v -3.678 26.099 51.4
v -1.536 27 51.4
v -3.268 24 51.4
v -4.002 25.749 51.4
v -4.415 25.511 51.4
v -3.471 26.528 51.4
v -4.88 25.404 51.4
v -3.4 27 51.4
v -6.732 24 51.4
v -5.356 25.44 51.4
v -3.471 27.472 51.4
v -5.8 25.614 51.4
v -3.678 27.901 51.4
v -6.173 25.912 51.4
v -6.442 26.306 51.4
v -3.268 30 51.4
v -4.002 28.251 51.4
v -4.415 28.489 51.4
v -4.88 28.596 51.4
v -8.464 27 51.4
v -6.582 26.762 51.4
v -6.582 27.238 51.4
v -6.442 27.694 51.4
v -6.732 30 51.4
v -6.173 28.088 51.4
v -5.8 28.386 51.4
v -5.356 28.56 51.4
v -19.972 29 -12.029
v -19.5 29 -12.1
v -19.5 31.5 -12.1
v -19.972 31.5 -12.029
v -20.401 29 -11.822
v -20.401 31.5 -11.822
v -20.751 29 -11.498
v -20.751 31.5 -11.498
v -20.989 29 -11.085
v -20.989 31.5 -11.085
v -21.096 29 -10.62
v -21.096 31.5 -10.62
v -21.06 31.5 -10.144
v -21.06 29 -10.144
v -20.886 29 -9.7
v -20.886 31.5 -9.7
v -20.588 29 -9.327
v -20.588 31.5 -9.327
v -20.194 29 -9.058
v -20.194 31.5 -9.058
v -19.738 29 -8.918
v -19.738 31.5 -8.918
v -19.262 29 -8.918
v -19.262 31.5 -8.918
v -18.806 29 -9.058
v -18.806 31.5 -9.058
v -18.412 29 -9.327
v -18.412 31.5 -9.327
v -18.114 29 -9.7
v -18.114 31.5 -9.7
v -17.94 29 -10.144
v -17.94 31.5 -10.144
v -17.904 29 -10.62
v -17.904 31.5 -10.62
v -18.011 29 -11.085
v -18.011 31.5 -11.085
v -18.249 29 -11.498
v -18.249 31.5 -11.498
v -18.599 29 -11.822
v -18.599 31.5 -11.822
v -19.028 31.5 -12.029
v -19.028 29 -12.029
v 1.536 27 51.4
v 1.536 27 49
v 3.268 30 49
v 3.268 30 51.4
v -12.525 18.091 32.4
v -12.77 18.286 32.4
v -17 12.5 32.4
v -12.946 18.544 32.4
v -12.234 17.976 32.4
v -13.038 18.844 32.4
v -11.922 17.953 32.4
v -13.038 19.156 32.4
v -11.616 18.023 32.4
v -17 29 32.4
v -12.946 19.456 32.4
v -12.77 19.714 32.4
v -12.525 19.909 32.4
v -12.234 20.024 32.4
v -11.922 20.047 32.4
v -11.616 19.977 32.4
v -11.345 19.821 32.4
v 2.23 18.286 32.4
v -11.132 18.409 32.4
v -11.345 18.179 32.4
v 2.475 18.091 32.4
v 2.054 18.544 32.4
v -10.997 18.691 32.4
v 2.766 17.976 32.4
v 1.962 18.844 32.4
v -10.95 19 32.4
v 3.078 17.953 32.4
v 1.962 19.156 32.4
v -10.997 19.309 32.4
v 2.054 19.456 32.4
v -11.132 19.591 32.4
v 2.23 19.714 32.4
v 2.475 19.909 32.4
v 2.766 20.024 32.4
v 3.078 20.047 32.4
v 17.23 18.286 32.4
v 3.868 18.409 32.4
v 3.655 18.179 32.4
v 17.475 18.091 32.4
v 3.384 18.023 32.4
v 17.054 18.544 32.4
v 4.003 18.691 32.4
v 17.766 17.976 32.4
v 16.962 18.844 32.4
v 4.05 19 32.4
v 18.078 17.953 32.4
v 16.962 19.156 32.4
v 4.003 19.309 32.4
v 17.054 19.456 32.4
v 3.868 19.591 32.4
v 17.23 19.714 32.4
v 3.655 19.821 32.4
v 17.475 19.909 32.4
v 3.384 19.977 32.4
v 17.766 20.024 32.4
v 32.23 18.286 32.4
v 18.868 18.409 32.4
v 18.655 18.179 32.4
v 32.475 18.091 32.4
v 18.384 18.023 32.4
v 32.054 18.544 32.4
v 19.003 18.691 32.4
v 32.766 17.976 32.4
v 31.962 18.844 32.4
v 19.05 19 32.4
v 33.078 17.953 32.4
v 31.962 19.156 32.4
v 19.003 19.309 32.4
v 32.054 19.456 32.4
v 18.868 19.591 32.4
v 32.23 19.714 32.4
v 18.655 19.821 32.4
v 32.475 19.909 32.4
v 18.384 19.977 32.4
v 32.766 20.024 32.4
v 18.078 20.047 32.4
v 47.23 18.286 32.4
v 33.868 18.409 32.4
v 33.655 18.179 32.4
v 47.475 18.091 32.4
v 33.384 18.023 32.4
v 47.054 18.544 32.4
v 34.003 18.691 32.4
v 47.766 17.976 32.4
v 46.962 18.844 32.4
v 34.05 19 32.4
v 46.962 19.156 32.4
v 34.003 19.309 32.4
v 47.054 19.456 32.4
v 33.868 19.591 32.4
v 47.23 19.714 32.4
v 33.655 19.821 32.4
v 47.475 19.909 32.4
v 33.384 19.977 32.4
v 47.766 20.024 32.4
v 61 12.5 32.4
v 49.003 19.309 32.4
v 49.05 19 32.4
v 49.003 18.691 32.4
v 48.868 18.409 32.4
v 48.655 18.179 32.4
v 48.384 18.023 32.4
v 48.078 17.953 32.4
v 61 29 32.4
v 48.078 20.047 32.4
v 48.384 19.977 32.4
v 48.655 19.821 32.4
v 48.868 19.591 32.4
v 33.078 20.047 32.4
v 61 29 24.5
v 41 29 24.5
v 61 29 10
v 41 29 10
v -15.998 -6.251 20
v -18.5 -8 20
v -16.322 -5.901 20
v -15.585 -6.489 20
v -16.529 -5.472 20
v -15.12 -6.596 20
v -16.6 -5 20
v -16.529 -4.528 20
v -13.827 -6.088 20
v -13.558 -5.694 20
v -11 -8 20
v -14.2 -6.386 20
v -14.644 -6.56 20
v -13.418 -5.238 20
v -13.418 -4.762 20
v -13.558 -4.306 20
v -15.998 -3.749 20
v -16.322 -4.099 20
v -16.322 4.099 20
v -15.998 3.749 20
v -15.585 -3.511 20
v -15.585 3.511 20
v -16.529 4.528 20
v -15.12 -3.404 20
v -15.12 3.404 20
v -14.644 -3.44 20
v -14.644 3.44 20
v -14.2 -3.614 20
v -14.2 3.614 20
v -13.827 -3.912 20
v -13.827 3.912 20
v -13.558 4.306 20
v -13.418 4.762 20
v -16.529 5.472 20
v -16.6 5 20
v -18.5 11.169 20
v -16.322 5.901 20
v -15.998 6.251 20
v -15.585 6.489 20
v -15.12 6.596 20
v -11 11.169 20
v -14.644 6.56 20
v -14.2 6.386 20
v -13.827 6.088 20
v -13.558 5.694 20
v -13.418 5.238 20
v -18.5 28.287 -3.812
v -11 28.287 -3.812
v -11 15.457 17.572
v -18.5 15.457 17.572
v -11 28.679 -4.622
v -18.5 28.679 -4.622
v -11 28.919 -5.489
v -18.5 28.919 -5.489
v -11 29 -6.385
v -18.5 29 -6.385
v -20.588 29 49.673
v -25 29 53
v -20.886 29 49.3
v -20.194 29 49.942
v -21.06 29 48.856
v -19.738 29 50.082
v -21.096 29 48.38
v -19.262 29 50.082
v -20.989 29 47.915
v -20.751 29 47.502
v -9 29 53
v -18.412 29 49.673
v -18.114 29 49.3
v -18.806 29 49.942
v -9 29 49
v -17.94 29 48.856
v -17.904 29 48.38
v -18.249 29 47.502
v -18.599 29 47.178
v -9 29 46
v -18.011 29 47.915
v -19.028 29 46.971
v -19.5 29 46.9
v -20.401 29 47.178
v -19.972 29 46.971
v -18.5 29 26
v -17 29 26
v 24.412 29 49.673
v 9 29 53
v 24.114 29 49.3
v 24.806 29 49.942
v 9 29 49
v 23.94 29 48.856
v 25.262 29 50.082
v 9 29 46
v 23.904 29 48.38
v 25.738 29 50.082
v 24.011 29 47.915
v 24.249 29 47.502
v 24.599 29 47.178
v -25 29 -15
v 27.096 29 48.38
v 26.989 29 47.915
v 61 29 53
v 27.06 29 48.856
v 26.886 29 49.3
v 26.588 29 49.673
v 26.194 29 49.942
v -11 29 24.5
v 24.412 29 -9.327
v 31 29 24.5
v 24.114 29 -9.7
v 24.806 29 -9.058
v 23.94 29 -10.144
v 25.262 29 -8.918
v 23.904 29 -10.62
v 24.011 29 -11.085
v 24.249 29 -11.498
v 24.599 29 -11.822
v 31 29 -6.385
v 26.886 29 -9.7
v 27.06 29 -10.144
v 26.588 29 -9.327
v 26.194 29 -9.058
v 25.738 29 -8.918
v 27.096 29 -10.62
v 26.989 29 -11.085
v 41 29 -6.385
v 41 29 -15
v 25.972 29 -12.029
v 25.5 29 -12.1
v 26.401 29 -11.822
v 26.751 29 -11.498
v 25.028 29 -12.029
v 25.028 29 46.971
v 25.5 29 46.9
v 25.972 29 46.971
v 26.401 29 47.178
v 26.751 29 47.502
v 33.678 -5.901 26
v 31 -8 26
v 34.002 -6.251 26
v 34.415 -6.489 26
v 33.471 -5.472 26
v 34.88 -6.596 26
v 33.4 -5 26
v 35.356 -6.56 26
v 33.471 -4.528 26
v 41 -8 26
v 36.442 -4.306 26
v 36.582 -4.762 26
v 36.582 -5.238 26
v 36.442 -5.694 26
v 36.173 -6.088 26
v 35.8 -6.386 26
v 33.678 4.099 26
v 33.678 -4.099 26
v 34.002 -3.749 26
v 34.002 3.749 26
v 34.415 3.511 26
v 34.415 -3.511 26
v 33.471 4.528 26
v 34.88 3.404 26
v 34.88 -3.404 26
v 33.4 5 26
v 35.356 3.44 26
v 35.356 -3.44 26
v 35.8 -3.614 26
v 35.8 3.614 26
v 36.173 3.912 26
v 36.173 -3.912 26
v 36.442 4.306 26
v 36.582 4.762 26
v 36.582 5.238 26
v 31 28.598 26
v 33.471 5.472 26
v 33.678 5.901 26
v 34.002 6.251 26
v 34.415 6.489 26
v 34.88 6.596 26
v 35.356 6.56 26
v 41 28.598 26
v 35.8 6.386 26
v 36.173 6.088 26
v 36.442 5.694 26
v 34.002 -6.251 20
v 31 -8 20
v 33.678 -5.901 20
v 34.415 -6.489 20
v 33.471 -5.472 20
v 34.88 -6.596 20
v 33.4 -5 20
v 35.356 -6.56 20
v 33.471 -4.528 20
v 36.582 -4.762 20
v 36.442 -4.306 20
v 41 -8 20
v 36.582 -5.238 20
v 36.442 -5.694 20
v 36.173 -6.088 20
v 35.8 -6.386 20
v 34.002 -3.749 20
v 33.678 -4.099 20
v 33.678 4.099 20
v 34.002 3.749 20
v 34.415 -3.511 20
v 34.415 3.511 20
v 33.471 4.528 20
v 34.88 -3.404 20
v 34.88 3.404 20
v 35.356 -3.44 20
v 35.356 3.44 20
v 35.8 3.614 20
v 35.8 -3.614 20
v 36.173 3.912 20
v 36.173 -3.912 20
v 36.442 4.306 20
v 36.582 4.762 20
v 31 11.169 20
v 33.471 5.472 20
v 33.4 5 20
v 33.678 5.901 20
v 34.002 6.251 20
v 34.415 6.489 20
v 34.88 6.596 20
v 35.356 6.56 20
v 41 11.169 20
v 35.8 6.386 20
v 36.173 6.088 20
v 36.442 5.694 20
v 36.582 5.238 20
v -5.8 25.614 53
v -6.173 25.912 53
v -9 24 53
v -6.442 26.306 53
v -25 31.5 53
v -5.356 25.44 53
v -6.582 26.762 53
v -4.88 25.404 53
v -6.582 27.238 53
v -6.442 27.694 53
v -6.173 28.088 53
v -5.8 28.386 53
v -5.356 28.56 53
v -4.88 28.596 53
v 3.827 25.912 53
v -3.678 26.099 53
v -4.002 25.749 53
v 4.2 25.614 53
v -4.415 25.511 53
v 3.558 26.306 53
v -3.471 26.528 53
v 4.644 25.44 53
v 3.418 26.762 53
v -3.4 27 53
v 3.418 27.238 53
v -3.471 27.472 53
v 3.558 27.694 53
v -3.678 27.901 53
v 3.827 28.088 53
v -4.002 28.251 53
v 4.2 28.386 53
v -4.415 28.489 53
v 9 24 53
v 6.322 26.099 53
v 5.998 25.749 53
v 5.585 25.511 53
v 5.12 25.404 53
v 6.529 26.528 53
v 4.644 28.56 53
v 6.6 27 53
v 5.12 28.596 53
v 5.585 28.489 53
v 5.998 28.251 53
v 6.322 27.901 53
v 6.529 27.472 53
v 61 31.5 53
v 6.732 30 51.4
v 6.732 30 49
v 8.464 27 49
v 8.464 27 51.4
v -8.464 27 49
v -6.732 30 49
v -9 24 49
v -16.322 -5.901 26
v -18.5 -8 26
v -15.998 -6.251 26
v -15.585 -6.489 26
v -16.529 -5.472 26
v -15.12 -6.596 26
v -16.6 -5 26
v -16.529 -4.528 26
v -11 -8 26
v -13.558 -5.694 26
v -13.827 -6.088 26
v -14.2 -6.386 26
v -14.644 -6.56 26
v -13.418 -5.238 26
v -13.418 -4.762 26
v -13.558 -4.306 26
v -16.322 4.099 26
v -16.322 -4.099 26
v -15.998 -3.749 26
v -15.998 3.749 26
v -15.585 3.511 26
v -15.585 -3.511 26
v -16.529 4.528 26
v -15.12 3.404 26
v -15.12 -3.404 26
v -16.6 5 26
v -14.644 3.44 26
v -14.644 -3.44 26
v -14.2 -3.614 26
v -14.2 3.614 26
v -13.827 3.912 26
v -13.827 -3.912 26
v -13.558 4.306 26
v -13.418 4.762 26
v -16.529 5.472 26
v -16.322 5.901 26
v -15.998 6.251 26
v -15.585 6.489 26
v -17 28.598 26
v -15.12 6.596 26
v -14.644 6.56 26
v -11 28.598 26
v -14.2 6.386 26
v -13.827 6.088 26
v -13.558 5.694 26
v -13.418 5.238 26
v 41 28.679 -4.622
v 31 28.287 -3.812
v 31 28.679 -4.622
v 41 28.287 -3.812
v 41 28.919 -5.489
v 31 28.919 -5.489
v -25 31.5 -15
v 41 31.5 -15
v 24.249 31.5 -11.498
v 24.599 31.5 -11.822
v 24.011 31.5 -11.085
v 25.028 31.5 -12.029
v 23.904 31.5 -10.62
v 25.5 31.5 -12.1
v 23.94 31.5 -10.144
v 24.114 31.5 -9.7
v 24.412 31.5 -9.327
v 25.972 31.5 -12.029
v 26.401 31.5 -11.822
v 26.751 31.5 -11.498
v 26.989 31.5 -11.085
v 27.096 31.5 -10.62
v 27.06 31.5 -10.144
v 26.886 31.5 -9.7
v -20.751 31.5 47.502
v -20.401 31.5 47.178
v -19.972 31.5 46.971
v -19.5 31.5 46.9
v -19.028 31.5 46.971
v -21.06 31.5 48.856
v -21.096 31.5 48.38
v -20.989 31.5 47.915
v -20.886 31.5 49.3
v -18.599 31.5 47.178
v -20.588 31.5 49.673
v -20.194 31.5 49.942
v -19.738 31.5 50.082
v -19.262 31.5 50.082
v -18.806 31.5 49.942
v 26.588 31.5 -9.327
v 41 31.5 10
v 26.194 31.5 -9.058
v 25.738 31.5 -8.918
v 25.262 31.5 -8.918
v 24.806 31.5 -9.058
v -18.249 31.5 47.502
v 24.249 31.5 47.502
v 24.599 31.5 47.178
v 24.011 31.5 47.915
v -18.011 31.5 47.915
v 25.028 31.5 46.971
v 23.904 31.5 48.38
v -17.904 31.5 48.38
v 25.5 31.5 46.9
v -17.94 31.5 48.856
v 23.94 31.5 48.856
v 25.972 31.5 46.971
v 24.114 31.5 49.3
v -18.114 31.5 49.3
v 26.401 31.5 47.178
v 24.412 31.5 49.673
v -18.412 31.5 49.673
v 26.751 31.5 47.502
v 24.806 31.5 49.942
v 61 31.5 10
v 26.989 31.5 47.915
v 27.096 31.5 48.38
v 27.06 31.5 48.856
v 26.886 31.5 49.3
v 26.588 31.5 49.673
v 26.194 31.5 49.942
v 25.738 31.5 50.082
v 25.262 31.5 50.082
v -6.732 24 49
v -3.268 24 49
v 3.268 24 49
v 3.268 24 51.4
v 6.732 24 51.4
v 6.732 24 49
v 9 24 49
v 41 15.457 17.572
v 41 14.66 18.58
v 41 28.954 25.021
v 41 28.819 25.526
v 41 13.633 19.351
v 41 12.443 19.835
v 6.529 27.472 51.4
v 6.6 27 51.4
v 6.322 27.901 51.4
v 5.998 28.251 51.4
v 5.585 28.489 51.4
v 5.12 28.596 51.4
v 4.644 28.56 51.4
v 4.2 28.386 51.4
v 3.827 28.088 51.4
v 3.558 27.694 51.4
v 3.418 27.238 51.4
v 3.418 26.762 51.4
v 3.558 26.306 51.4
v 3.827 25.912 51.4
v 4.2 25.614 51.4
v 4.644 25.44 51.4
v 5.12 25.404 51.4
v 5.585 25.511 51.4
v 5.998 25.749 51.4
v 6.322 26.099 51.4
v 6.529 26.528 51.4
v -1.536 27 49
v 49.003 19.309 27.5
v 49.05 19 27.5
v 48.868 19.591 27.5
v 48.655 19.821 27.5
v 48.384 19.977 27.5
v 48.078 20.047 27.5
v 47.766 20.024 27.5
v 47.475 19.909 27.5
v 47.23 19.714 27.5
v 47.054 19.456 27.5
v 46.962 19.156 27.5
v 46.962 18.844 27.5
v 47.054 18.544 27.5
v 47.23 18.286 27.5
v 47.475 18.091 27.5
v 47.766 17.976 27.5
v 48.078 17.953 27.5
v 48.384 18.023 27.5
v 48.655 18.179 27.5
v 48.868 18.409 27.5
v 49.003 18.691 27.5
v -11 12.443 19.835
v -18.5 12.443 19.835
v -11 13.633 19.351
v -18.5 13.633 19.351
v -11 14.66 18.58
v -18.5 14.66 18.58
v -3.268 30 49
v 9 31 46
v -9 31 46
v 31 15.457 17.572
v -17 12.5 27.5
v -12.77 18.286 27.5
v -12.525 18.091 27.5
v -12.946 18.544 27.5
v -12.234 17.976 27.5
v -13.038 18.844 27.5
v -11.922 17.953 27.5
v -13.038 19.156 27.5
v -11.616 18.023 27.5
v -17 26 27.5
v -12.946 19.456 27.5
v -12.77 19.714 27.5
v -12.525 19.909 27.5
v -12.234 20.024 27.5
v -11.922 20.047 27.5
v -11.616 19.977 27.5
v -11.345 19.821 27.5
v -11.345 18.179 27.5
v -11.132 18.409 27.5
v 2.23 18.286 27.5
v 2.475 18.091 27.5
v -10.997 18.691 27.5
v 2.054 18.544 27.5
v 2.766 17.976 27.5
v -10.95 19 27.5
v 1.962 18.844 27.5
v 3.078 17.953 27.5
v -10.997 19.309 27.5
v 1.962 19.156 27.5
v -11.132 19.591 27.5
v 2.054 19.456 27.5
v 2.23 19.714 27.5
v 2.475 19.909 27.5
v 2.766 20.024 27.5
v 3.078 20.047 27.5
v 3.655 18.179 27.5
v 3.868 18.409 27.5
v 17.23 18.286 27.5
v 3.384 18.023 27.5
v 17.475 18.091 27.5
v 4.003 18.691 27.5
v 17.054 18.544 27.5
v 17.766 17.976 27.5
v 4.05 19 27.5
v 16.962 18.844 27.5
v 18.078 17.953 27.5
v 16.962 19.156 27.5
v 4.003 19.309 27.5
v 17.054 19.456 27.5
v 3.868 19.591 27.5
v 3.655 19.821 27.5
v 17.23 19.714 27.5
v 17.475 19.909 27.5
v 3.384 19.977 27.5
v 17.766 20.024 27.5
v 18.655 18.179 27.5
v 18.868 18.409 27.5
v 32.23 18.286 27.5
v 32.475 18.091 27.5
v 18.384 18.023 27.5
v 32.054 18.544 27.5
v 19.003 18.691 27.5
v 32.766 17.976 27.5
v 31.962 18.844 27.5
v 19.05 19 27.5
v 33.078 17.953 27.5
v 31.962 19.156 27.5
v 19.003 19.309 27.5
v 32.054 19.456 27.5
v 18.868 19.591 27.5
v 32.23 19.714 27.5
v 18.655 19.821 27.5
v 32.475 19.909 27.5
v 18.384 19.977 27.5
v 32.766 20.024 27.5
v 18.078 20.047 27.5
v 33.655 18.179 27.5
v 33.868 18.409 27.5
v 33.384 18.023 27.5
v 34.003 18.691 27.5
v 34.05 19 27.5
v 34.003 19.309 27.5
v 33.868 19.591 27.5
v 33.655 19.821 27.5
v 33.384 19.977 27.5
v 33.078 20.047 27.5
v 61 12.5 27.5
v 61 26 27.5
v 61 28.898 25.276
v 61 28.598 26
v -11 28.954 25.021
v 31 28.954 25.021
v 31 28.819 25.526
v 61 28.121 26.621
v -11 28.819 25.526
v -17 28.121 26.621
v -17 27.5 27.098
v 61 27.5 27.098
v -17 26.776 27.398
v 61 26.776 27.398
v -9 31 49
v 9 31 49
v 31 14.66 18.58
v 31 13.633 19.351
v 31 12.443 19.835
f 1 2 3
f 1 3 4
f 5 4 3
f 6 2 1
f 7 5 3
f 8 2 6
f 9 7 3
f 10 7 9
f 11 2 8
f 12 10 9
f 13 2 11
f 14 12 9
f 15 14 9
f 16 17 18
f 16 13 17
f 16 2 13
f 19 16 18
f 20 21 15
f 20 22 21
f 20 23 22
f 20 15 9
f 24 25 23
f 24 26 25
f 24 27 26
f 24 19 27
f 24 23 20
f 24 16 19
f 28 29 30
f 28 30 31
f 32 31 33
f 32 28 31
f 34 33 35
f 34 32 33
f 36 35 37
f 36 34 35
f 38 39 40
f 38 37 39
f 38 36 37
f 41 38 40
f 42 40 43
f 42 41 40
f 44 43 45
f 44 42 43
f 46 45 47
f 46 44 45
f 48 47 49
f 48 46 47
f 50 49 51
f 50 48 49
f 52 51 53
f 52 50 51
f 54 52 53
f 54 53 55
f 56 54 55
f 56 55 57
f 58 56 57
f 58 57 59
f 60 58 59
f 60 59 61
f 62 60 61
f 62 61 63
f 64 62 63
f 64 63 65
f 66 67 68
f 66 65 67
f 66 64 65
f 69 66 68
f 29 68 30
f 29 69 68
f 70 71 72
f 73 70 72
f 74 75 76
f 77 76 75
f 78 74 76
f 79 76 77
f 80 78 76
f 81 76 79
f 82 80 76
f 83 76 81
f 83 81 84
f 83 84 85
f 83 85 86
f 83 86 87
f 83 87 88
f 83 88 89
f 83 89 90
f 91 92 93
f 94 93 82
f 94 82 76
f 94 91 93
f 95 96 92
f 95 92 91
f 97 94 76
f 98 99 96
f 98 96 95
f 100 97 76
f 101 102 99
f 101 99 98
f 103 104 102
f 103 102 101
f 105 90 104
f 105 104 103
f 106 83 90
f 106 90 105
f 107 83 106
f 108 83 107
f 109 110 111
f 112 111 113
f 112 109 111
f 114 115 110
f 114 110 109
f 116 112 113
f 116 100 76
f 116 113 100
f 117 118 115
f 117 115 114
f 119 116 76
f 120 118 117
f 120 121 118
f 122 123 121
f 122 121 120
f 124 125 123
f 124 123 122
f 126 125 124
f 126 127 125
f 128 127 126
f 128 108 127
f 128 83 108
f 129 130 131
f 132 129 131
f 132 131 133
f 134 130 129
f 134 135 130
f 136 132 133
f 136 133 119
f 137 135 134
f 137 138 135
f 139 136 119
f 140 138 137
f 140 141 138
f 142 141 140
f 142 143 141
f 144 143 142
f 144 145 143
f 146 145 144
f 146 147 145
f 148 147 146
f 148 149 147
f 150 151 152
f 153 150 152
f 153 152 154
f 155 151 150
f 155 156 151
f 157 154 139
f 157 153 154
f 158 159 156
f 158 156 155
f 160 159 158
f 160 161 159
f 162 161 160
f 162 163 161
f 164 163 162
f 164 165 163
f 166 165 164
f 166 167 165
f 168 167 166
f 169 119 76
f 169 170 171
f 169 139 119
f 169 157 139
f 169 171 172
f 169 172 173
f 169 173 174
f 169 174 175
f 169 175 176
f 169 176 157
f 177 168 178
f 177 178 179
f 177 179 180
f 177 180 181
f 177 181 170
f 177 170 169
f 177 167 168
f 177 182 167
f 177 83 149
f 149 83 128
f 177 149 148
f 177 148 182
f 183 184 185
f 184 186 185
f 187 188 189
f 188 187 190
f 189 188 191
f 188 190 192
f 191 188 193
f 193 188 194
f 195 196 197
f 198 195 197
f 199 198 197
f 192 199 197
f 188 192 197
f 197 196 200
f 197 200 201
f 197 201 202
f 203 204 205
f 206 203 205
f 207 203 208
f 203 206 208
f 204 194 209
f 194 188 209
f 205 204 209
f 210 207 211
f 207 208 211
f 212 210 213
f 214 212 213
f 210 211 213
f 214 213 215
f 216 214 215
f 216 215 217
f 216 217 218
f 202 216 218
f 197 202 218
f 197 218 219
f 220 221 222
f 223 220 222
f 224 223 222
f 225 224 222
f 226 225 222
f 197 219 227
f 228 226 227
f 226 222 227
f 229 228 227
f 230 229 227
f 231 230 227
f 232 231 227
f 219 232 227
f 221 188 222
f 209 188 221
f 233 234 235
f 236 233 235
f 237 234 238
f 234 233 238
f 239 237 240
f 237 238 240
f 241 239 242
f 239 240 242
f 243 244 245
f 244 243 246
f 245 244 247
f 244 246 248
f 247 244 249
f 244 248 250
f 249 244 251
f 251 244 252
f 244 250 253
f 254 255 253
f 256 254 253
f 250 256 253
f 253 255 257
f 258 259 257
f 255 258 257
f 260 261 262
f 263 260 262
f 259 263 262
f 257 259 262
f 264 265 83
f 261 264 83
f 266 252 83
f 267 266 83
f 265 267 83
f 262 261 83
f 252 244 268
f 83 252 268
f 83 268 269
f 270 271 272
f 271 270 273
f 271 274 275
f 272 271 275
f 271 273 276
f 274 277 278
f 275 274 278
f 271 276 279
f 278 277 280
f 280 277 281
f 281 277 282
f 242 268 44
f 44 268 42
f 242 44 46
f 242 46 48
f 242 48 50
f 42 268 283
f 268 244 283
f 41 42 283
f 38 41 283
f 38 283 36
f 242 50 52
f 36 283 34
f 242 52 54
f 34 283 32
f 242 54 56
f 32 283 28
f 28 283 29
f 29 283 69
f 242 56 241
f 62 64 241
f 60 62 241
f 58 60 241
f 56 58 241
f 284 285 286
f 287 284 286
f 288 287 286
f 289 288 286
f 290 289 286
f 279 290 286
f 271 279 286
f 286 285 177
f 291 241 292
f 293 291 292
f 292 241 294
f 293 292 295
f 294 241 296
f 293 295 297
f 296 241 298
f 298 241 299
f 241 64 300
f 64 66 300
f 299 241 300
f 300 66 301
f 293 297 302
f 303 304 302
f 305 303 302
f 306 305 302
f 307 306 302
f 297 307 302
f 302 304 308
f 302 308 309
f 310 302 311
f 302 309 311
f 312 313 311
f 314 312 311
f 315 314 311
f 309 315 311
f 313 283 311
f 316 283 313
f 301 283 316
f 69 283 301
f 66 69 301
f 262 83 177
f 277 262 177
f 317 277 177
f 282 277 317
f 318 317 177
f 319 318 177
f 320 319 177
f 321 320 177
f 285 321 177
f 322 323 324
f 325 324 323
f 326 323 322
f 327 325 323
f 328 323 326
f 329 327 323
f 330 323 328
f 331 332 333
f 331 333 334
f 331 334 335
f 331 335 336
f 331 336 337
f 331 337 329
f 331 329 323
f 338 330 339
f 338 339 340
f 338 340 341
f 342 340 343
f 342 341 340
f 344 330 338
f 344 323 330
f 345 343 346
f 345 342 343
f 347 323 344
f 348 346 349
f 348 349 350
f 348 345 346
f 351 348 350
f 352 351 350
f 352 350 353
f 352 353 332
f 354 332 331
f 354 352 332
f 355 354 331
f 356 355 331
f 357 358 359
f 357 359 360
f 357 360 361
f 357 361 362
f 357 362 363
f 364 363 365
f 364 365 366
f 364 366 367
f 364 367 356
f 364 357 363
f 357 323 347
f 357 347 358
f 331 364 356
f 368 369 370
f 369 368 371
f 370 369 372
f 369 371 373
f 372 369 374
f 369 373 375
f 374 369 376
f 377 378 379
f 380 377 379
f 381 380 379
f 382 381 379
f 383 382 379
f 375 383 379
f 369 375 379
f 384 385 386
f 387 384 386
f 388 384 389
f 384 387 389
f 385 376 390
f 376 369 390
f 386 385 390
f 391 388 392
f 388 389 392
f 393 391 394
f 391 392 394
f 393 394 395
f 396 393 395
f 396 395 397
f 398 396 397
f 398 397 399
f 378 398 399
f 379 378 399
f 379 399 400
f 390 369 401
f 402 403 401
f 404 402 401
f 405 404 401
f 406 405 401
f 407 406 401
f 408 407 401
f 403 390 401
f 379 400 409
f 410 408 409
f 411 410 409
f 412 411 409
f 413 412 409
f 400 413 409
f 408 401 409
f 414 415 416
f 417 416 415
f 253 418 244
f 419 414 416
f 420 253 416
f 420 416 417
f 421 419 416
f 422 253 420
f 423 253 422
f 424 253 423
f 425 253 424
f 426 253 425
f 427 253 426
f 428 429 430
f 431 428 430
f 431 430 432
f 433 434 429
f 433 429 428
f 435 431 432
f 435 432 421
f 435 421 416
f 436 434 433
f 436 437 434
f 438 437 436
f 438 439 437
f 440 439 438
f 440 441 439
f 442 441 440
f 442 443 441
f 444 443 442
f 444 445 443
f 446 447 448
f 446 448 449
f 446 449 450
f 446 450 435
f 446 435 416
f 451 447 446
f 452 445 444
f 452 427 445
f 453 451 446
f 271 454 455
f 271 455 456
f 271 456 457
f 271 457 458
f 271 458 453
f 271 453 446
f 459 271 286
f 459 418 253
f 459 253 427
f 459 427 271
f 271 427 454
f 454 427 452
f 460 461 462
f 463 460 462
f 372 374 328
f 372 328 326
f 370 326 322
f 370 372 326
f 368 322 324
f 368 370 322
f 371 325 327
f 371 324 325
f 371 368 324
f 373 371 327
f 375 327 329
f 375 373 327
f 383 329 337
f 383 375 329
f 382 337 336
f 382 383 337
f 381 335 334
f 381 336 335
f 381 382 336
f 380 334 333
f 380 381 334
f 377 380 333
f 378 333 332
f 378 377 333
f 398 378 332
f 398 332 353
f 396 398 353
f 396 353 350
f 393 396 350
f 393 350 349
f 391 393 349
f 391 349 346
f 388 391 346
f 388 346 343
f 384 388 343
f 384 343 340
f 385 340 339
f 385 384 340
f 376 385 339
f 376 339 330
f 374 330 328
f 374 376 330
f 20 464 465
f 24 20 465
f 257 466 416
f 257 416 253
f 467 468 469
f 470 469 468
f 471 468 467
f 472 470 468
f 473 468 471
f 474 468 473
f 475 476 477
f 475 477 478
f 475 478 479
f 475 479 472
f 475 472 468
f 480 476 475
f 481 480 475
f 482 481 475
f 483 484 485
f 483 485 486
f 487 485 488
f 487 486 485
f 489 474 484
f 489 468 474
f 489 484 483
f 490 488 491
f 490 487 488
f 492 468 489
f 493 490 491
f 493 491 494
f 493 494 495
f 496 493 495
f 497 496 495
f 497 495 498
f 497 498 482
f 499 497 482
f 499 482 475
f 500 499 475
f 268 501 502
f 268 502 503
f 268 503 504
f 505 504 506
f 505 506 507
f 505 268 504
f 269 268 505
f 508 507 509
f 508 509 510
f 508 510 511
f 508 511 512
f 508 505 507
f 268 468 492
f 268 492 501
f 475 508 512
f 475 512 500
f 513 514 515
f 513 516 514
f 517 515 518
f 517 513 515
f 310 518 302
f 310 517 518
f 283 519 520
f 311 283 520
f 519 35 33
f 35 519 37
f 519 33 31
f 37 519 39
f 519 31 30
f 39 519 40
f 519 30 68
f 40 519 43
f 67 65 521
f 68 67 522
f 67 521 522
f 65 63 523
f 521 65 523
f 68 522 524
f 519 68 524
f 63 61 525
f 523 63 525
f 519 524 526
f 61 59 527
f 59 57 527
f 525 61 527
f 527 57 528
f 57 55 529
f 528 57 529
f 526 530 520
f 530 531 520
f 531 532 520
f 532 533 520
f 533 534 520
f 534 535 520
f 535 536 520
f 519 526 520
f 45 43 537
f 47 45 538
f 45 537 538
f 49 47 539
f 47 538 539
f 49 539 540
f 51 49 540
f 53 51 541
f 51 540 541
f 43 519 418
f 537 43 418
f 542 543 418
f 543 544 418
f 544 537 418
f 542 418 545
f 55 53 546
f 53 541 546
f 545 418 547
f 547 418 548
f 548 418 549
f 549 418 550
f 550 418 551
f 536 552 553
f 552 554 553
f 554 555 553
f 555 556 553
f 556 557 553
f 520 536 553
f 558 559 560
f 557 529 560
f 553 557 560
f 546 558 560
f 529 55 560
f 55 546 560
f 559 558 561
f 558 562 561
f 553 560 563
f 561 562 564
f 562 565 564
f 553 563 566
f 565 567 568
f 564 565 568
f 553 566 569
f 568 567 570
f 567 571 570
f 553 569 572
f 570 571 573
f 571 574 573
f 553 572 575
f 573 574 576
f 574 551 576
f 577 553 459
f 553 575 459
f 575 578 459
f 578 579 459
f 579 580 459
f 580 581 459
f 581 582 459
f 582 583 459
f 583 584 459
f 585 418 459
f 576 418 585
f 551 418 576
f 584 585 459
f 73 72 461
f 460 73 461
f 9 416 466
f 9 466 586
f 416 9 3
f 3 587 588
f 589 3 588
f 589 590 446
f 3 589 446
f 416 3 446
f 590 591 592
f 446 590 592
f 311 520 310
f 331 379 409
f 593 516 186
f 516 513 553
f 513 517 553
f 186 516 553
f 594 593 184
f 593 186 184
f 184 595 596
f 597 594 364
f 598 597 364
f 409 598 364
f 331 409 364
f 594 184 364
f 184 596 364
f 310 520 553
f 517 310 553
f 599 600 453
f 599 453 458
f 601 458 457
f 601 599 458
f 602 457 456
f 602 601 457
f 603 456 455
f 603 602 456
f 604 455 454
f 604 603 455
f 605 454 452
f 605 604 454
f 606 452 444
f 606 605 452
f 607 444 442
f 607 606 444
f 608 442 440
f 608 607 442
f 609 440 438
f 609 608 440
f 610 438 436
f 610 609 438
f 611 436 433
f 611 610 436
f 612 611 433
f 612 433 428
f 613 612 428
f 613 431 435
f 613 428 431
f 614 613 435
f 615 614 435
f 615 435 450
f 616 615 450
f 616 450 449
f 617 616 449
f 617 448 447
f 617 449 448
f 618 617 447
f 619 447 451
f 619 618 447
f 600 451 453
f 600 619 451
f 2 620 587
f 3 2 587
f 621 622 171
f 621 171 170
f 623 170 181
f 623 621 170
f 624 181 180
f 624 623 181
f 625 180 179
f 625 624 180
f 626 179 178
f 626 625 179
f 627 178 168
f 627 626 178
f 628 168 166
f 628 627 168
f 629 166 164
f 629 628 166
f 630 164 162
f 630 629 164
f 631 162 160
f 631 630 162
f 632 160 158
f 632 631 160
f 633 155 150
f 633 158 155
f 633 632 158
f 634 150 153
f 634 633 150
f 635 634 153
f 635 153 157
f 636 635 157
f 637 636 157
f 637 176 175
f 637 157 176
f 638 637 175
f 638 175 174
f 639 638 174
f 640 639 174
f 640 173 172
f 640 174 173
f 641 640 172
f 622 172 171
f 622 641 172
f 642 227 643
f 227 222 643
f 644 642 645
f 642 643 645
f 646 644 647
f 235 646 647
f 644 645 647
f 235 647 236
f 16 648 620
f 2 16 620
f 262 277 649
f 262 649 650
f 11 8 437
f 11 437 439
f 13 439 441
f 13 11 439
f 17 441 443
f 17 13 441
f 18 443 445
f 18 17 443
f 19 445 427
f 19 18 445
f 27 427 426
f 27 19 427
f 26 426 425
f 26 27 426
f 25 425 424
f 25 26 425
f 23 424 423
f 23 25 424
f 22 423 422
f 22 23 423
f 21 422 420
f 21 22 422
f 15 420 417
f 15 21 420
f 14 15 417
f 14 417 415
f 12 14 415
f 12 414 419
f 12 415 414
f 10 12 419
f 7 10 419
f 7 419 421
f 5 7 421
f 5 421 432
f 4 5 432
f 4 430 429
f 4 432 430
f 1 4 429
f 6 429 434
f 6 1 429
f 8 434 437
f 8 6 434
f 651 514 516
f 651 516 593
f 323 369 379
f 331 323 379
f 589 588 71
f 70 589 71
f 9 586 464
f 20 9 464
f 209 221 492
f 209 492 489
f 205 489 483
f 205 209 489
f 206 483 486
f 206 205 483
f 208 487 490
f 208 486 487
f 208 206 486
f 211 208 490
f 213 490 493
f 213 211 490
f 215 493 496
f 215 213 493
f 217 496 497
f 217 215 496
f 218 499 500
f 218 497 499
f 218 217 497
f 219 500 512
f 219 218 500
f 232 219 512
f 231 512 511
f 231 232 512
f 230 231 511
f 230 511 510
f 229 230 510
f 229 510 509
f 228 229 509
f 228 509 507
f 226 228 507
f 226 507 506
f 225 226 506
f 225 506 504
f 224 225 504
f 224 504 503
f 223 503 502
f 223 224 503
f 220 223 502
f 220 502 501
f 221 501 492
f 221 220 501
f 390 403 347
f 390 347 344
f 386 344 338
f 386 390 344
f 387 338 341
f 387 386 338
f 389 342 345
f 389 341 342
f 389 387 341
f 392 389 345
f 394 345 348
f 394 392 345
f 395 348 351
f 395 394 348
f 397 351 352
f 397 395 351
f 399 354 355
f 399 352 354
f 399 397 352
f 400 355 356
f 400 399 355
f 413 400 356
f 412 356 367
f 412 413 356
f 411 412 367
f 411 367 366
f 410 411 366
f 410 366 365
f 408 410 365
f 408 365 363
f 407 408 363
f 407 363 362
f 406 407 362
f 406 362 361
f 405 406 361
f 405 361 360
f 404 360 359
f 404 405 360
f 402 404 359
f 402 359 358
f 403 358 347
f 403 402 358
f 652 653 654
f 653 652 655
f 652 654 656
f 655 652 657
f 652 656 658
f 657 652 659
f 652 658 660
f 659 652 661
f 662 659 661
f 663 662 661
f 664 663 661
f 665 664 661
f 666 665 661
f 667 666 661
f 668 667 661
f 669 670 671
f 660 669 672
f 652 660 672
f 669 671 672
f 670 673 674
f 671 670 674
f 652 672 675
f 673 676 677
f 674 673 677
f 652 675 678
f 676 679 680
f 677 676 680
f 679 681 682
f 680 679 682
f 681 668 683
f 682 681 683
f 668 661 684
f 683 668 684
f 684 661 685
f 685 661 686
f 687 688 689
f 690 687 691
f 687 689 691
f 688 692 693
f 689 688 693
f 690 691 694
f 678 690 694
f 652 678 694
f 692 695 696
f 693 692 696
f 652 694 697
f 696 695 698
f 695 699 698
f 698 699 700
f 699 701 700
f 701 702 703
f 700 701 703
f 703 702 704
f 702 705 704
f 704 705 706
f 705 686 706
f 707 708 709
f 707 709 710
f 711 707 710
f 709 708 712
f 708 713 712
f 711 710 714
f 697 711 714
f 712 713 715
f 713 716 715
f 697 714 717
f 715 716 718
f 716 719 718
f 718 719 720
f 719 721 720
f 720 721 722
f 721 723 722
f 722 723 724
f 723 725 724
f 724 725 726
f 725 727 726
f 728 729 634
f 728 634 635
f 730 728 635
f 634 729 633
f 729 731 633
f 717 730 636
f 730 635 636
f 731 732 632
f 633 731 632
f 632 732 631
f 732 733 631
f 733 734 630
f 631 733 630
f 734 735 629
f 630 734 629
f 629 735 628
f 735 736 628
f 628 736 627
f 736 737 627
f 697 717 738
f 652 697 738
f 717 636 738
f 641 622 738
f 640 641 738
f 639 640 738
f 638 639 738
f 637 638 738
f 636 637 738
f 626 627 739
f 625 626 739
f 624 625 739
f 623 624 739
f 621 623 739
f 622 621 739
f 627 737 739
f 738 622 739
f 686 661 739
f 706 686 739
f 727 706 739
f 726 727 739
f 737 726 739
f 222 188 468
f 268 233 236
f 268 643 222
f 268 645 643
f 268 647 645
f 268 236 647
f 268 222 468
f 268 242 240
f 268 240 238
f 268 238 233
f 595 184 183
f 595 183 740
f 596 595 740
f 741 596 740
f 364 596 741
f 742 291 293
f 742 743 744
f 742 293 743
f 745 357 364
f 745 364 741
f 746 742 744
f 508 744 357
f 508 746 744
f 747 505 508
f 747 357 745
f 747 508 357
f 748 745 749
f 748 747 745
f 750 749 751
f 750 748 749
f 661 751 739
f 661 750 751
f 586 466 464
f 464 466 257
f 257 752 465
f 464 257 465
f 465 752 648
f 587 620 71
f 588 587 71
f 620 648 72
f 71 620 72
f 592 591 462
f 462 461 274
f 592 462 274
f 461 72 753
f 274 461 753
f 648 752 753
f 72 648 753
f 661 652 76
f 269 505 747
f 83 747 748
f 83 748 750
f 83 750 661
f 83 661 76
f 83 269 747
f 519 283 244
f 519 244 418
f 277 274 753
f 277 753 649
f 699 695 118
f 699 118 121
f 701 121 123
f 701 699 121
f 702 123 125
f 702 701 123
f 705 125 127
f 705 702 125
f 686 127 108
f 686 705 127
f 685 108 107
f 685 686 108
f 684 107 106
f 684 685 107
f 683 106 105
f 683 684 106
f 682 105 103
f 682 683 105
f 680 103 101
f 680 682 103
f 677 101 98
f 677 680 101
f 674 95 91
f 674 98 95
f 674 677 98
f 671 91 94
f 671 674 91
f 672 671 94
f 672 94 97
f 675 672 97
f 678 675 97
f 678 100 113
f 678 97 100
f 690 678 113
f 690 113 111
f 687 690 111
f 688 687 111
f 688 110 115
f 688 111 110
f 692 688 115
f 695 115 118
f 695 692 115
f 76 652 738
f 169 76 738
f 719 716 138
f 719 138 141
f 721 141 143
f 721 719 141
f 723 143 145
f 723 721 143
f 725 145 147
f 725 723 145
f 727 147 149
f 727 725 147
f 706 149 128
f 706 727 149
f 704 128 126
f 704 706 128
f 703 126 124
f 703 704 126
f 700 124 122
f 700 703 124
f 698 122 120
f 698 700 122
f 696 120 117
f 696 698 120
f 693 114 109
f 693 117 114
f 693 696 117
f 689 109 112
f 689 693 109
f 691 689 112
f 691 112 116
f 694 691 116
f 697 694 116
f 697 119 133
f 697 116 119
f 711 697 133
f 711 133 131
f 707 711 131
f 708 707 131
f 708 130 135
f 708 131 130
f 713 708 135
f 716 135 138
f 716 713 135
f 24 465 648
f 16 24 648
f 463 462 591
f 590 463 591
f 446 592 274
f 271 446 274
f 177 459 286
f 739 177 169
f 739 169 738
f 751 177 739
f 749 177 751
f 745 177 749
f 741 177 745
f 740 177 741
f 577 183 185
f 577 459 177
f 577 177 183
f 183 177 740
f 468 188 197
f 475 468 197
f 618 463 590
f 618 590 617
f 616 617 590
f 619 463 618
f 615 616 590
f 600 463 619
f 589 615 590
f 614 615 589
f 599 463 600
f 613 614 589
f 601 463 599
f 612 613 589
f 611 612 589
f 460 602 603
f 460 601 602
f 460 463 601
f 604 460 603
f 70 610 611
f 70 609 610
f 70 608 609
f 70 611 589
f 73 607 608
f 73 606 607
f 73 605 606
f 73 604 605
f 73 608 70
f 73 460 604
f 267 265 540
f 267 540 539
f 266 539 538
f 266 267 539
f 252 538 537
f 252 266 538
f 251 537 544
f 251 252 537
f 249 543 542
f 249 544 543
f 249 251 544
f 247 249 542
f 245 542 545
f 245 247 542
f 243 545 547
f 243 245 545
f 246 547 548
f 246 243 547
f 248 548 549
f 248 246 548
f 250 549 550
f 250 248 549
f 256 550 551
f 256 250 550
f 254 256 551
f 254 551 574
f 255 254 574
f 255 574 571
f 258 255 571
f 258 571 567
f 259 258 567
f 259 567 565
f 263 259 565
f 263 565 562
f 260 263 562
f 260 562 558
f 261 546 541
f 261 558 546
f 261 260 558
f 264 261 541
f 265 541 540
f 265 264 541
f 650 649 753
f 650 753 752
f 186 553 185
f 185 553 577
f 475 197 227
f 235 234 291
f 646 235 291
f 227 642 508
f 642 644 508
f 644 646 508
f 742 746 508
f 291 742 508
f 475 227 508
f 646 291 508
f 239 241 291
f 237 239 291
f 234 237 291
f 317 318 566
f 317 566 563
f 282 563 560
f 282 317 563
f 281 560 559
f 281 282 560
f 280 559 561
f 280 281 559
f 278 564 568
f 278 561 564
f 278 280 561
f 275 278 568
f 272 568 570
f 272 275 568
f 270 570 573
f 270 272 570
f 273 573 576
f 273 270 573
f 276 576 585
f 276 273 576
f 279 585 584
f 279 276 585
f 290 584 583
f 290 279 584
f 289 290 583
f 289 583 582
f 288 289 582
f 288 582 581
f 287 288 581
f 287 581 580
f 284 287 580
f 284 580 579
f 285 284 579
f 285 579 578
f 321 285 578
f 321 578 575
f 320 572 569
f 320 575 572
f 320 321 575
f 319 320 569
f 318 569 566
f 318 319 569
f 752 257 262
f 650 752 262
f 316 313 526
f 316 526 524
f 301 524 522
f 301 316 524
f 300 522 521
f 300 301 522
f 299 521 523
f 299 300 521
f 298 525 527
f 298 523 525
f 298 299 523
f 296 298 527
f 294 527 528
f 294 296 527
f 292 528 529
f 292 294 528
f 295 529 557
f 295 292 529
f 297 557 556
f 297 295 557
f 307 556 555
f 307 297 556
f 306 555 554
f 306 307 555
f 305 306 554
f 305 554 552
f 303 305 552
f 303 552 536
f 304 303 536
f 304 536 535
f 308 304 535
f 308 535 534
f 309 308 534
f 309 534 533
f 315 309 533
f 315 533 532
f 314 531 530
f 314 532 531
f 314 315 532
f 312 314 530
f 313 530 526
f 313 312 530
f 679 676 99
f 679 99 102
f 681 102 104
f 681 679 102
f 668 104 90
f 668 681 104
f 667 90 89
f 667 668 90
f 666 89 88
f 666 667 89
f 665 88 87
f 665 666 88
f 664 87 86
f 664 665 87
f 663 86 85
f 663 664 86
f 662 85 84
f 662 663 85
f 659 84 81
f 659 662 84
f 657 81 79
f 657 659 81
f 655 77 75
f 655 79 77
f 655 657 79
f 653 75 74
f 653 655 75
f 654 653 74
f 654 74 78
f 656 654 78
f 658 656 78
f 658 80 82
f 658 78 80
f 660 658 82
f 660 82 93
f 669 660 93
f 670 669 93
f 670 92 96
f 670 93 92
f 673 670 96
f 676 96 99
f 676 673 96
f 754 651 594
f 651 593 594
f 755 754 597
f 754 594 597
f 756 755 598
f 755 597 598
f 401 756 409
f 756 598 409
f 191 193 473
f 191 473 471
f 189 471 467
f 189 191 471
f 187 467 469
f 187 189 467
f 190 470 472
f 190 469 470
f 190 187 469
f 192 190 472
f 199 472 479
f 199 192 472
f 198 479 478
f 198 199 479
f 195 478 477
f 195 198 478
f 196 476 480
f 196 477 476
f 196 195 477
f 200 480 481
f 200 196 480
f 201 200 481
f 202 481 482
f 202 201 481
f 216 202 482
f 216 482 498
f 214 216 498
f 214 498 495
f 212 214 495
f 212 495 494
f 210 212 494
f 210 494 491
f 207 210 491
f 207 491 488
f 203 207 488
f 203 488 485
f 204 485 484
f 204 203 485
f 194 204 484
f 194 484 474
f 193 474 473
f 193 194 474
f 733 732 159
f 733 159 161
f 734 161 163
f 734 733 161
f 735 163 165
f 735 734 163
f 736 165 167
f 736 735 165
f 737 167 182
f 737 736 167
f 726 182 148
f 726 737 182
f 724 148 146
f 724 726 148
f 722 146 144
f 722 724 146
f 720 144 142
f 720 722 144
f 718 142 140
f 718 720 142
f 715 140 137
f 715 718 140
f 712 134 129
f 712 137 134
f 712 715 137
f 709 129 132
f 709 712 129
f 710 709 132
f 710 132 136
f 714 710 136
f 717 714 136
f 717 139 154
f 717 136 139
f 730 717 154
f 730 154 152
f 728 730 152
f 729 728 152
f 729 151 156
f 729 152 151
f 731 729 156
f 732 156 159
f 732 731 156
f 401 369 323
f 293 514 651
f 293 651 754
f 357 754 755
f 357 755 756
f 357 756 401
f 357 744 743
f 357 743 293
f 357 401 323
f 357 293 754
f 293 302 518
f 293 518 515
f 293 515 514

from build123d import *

# Parameters (mm, degrees)
ORTHOGONAL_START                              = -15
ORTHOGONAL_CHASSIS_PLATE_PRIMARY_PROFILE_W    = 66
ORTHOGONAL_CHASSIS_PLATE_PRIMARY_PROFILE_H    = 4
ORTHOGONAL_CHASSIS_PLATE_PRIMARY_DEPTH        = 25.1
ORTHOGONAL_START_2                            = 10
ORTHOGONAL_CHASSIS_PLATE_GUIDE_SIDE_PROF_W    = 109
ORTHOGONAL_CHASSIS_PLATE_GUIDE_SIDE_PROF_H    = 4
ORTHOGONAL_CHASSIS_PLATE_GUIDE_SIDE_DEPTH     = 43
HORIZONTAL_START                              = 20
HORIZONTAL_SERVO_SEAT_UPRIGHTS_PROFILE_W      = 7.5
HORIZONTAL_SERVO_SEAT_UPRIGHTS_PROFILE_H      = 37.1
HORIZONTAL_SERVO_SEAT_UPRIGHTS_PROFILE_W_2    = 10
HORIZONTAL_SERVO_SEAT_UPRIGHTS_DEPTH          = 6
SIDE_START                                    = 27.5
SIDE_MOUNTING_FACE_FOR_MGN7_RAIL_PROFILE_W    = 100
SIDE_MOUNTING_FACE_FOR_MGN7_RAIL_PROFILE_H    = 16.6
SIDE_MOUNTING_FACE_FOR_MGN7_RAIL_DEPTH        = 4.9
HORIZONTAL_START_2                            = 49
HORIZONTAL_LIMIT_BRACKET_FOOT_SUPPORT_PR_W    = 18
HORIZONTAL_LIMIT_BRACKET_FOOT_SUPPORT_PR_H    = 5.1
HORIZONTAL_LIMIT_BRACKET_FOOT_SUPPORT_DEPTH   = 4
CHASSIS_START                                 = 28.9
CHASSIS_MOUNTING_HOLE_LAYOUT_45_X_41_2_R      = 1.6
CHASSIS_MOUNTING_HOLE_LAYOUT_45_X_41_MM_DEPTH = 4.2
SERVO_START                                   = 19.9
SERVO_MOUNT_50_X_10_MM_PITCH_PROFILE_R        = 1.6
SERVO_MOUNT_50_X_10_MM_PITCH_DEPTH            = 6.2
GUIDE_START                                   = 27.45
GUIDE_M2_MOUNTING_PILOTS_15_MM_PITCH_PRO_R    = 1.05
GUIDE_M2_MOUNTING_PILOTS_15_MM_PITCH_DEPTH    = 5.05
STOP_START                                    = 48.9
STOP_MOUNTING_TWO_M3_PILOTS_10_MM_PI_2_R      = 1.6
STOP_MOUNTING_TWO_M3_PILOTS_10_MM_PITCH_DEPTH = 4.2
FILLET_2_R                                    = 3
SKETCH_3_W                                    = 18
SKETCH_3_H                                    = 3
CUT_EXTRUDE_1_DEPTH                           = 2
CUT_EXTRUDE_2_DEPTH                           = 2.4
EXTRUDE_3_DEPTH                               = 7.5
EXTRUDE_4_DEPTH                               = 10
FILLET_3_R                                    = 5
SKETCH_7_W                                    = 109
SKETCH_7_H                                    = 1.5
CUT_EXTRUDE_3_DEPTH                           = 80
SKETCH_8_W                                    = 23
SKETCH_8_H                                    = 43
CUT_EXTRUDE_4_DEPTH                           = 30


with BuildPart() as part:
    # Orthogonal chassis plate primary profile → Orthogonal chassis plate primary (new body)
    with BuildSketch(Plane.XY.offset(ORTHOGONAL_START)):
        with Locations((8, 31)):
            Rectangle(ORTHOGONAL_CHASSIS_PLATE_PRIMARY_PROFILE_W, ORTHOGONAL_CHASSIS_PLATE_PRIMARY_PROFILE_H)
    extrude(amount=ORTHOGONAL_CHASSIS_PLATE_PRIMARY_DEPTH)

    # Orthogonal chassis plate guide side profile → Orthogonal chassis plate guide side (add)
    with BuildSketch(Plane.XY.offset(ORTHOGONAL_START_2)):
        with Locations((29.5, 31)):
            Rectangle(ORTHOGONAL_CHASSIS_PLATE_GUIDE_SIDE_PROF_W, ORTHOGONAL_CHASSIS_PLATE_GUIDE_SIDE_PROF_H)
    extrude(amount=ORTHOGONAL_CHASSIS_PLATE_GUIDE_SIDE_DEPTH)

    # Horizontal servo seat uprights profile → Horizontal servo seat uprights (add)
    with BuildSketch(Plane.XY.offset(HORIZONTAL_START)):
        with Locations((-14.75, 10.55)):
            Rectangle(HORIZONTAL_SERVO_SEAT_UPRIGHTS_PROFILE_W, HORIZONTAL_SERVO_SEAT_UPRIGHTS_PROFILE_H)
        with Locations((36, 10.55)):
            Rectangle(HORIZONTAL_SERVO_SEAT_UPRIGHTS_PROFILE_W_2, HORIZONTAL_SERVO_SEAT_UPRIGHTS_PROFILE_H)
    extrude(amount=HORIZONTAL_SERVO_SEAT_UPRIGHTS_DEPTH)

    # Side mounting face for MGN7 rail profile → Side mounting face for MGN7 rail (add)
    with BuildSketch(Plane.XY.offset(SIDE_START)):
        with Locations((33, 20.8)):
            Rectangle(SIDE_MOUNTING_FACE_FOR_MGN7_RAIL_PROFILE_W, SIDE_MOUNTING_FACE_FOR_MGN7_RAIL_PROFILE_H)
    extrude(amount=SIDE_MOUNTING_FACE_FOR_MGN7_RAIL_DEPTH)

    # Horizontal limit bracket foot support profile → Horizontal limit bracket foot support (add)
    with BuildSketch(Plane.XY.offset(HORIZONTAL_START_2)):
        with Locations((0, 26.55)):
            Rectangle(HORIZONTAL_LIMIT_BRACKET_FOOT_SUPPORT_PR_W, HORIZONTAL_LIMIT_BRACKET_FOOT_SUPPORT_PR_H)
    extrude(amount=HORIZONTAL_LIMIT_BRACKET_FOOT_SUPPORT_DEPTH)

    # Chassis mounting hole layout 45 x 41 2 → Chassis mounting hole layout 45 x 41 mm (cut)
    with BuildSketch(Plane(origin=(0, 0, 0), x_dir=(1, 0, 0), z_dir=(0, 1, 0)).offset(CHASSIS_START)):
        with Locations(Location((-19.5, 10.5, 0), (0, 0, 90))):
            Circle(CHASSIS_MOUNTING_HOLE_LAYOUT_45_X_41_2_R)
        with Locations(Location((-19.5, -48.5, 0), (0, 0, 90))):
            Circle(CHASSIS_MOUNTING_HOLE_LAYOUT_45_X_41_2_R)
        with Locations(Location((25.5, 10.5, 0), (0, 0, 90))):
            Circle(CHASSIS_MOUNTING_HOLE_LAYOUT_45_X_41_2_R)
        with Locations(Location((25.5, -48.5, 0), (0, 0, 90))):
            Circle(CHASSIS_MOUNTING_HOLE_LAYOUT_45_X_41_2_R)
        with Locations(Location((70.5, -48.5, 0), (0, 0, 90))):
            Circle(CHASSIS_MOUNTING_HOLE_LAYOUT_45_X_41_2_R)
    extrude(amount=CHASSIS_MOUNTING_HOLE_LAYOUT_45_X_41_MM_DEPTH, mode=Mode.SUBTRACT)

    # Servo mount 50 x 10 mm pitch profile → Servo mount 50 x 10 mm pitch (cut)
    with BuildSketch(Plane.XY.offset(SERVO_START)):
        with Locations(Location((-15, -5, 0), (0, 0, 180))):
            Circle(SERVO_MOUNT_50_X_10_MM_PITCH_PROFILE_R)
        with Locations(Location((-15, 5, 0), (0, 0, 180))):
            Circle(SERVO_MOUNT_50_X_10_MM_PITCH_PROFILE_R)
        with Locations(Location((35, -5, 0), (0, 0, 180))):
            Circle(SERVO_MOUNT_50_X_10_MM_PITCH_PROFILE_R)
        with Locations(Location((35, 5, 0), (0, 0, 180))):
            Circle(SERVO_MOUNT_50_X_10_MM_PITCH_PROFILE_R)
    extrude(amount=SERVO_MOUNT_50_X_10_MM_PITCH_DEPTH, mode=Mode.SUBTRACT)

    # Guide M2 mounting pilots 15 mm pitch profile → Guide M2 mounting pilots 15 mm pitch (cut)
    with BuildSketch(Plane.XY.offset(GUIDE_START)):
        with Locations((-12, 19)):
            Circle(GUIDE_M2_MOUNTING_PILOTS_15_MM_PITCH_PRO_R)
        with Locations((3, 19)):
            Circle(GUIDE_M2_MOUNTING_PILOTS_15_MM_PITCH_PRO_R)
        with Locations((18, 19)):
            Circle(GUIDE_M2_MOUNTING_PILOTS_15_MM_PITCH_PRO_R)
        with Locations((33, 19)):
            Circle(GUIDE_M2_MOUNTING_PILOTS_15_MM_PITCH_PRO_R)
        with Locations((48, 19)):
            Circle(GUIDE_M2_MOUNTING_PILOTS_15_MM_PITCH_PRO_R)
        with Locations((63, 19)):
            Circle(GUIDE_M2_MOUNTING_PILOTS_15_MM_PITCH_PRO_R)
        with Locations((78, 19)):
            Circle(GUIDE_M2_MOUNTING_PILOTS_15_MM_PITCH_PRO_R)
    extrude(amount=GUIDE_M2_MOUNTING_PILOTS_15_MM_PITCH_DEPTH, mode=Mode.SUBTRACT)

    # Stop mounting two M3 pilots 10 mm pi 2 → Stop mounting two M3 pilots 10 mm pitch (cut)
    with BuildSketch(Plane.XY.offset(STOP_START)):
        with Locations((-5, 27)):
            Circle(STOP_MOUNTING_TWO_M3_PILOTS_10_MM_PI_2_R)
        with Locations((5, 27)):
            Circle(STOP_MOUNTING_TWO_M3_PILOTS_10_MM_PI_2_R)
    extrude(amount=STOP_MOUNTING_TWO_M3_PILOTS_10_MM_PITCH_DEPTH, mode=Mode.SUBTRACT)

    # 圆角2
    # the kernel refuses this fillet: 3 mm, written as the material it adds along each edge
    with BuildSketch(Plane(origin=(-17, 29, 27.5), x_dir=(0, 0, -1), z_dir=(1, 0, 0))) as fillet_2_piece_1:
        with BuildLine():
            CenterArc((FILLET_2_R, -FILLET_2_R), FILLET_2_R, 90, 90)
            Line((0, -FILLET_2_R), (0, 0))
            Line((0, 0), (FILLET_2_R, 0))
        make_face()
    extrude(amount=100)

    # 草图3 → 切除-拉伸1 (cut)
    with BuildSketch(Plane(origin=(0, 29, 0), x_dir=(-1, 0, 0), z_dir=(0, -1, 0))):
        with Locations((0, -47.5)):
            Rectangle(SKETCH_3_W, SKETCH_3_H)
    extrude(amount=-CUT_EXTRUDE_1_DEPTH, mode=Mode.SUBTRACT)

    # 草图4 → 切除-拉伸2 (cut)
    with BuildSketch(Plane(origin=(0, 0, 49), x_dir=(-1, 0, 0), z_dir=(0, 0, -1))):
        Polygon((-3.267949192, 30), (-6.732050808, 30), (-8.464101615, 27), (-6.732050808, 24), (-3.267949192, 24), (-1.535898385, 27), align=None)
        Polygon((6.732050808, 30), (3.267949192, 30), (1.535898385, 27), (3.267949192, 24), (6.732050808, 24), (8.464101615, 27), align=None)
    extrude(amount=-CUT_EXTRUDE_2_DEPTH, mode=Mode.SUBTRACT)

    # 草图5 → 凸台-拉伸3 (add)
    with BuildSketch(Plane(origin=(-11, 0, 0), x_dir=(0, 0, -1), z_dir=(1, 0, 0))):
        Polygon((-20, 29), (5, 29), (-20, 14), align=None)
    extrude(amount=-EXTRUDE_3_DEPTH)

    # 草图6 → 凸台-拉伸4 (add)
    with BuildSketch(Plane.ZY.offset(-31)):
        Polygon((20, 29), (-5, 29), (20, 14), align=None)
    extrude(amount=-EXTRUDE_4_DEPTH)

    # 圆角3
    fillet_3_edges = [part.edges().sort_by_distance(p)[0] for p in [
        (-14.75, 14, 20),
        (-14.75, 29, -5),
        (36, 14, 20),
        (36, 29, -5),
    ]]
    fillet(fillet_3_edges, radius=FILLET_3_R)

    # 草图7 → 切除-拉伸3 (cut)
    with BuildSketch(Plane.XY.offset(53)):
        with Locations((29.5, 32.25)):
            Rectangle(SKETCH_7_W, SKETCH_7_H)
    extrude(amount=-CUT_EXTRUDE_3_DEPTH, mode=Mode.SUBTRACT)

    # 草图8 → 切除-拉伸4 (cut)
    with BuildSketch(Plane(origin=(0, 31.5, 0), x_dir=(1, 0, 0), z_dir=(0, 1, 0))):
        with Locations((72.5, -31.5)):
            Rectangle(SKETCH_8_W, SKETCH_8_H)
    extrude(amount=-CUT_EXTRUDE_4_DEPTH, mode=Mode.SUBTRACT)


solid = part.part
